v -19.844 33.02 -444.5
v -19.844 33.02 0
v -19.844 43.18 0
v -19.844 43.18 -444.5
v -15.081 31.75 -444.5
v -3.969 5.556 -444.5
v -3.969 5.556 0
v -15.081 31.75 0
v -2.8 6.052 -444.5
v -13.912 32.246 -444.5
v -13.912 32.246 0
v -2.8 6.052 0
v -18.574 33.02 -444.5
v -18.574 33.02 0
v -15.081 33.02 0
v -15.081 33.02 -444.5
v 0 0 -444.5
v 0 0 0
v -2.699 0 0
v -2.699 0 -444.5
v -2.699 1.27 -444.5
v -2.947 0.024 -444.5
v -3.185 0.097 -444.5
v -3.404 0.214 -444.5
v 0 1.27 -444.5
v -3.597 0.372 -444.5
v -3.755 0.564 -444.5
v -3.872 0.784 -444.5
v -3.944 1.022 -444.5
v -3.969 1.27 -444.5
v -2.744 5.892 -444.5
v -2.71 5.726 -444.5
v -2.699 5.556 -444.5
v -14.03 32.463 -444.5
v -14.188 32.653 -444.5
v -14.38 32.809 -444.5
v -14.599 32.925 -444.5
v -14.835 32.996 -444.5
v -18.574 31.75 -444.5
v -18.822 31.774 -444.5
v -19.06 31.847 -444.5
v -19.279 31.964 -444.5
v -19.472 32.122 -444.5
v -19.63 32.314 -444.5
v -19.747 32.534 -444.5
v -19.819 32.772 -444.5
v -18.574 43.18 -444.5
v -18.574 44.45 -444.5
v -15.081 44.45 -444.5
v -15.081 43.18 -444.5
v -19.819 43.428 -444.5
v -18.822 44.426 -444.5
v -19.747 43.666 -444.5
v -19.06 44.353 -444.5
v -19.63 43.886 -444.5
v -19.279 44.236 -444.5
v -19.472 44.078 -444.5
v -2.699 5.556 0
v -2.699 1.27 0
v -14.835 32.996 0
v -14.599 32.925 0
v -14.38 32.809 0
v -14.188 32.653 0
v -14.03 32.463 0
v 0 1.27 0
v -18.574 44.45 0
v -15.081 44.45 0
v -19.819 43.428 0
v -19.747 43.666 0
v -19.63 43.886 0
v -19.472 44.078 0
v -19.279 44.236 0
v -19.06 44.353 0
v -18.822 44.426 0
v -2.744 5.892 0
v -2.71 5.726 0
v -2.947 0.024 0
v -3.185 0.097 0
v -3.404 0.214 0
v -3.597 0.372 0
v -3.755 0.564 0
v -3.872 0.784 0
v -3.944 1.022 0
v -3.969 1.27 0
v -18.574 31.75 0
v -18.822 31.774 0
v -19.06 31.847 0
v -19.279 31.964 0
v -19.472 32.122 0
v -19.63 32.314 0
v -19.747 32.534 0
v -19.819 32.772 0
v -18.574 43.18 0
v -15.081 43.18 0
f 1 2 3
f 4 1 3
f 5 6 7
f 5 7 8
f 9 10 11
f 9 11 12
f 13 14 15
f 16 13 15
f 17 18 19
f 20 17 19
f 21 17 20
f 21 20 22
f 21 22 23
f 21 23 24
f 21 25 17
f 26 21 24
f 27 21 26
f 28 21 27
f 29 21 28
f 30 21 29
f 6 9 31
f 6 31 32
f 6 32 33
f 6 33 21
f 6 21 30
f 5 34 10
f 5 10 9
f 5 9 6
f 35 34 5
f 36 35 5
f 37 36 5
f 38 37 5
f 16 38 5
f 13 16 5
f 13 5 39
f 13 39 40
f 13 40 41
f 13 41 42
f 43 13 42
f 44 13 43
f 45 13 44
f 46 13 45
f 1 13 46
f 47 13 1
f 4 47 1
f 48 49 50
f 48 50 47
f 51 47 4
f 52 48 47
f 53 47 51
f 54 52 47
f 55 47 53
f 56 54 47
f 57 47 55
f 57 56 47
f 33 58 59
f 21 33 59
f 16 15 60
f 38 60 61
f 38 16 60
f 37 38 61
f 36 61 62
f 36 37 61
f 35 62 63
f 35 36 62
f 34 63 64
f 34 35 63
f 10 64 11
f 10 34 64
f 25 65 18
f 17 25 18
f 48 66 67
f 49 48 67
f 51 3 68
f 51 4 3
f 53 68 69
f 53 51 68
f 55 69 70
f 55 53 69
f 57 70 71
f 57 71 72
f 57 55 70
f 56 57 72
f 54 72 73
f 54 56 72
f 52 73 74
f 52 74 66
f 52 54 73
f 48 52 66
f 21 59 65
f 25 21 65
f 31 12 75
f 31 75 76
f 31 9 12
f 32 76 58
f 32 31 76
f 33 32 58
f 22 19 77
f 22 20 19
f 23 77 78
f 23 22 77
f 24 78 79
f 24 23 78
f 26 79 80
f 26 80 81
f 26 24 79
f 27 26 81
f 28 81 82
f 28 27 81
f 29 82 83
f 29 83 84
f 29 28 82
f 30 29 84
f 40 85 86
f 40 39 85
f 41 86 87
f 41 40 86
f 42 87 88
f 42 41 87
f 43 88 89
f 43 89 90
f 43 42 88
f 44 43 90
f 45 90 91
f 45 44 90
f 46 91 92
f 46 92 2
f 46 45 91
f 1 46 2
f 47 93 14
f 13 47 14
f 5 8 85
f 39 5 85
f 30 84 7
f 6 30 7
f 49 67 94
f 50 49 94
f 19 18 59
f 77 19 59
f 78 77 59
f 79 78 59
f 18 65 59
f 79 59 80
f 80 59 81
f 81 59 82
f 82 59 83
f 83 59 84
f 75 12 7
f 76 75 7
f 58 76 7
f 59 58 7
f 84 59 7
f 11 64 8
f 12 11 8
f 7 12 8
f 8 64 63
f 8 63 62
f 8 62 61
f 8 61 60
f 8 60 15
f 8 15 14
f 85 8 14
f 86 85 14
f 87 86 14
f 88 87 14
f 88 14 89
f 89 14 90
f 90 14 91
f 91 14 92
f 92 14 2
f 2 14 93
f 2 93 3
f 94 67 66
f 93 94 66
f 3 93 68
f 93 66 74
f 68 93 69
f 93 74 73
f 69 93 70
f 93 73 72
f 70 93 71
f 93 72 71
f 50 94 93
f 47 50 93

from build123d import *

# Parameters (mm, degrees)
EXTRUDE_THIN1_DEPTH = 444.5
FILLET1_R           = 1.27


with BuildPart() as part:
    # Sketch1 → Extrude-Thin1 (new body)
    with BuildSketch(Plane.XY):
        Polygon((0, 0), (-3.96875, 0), (-3.96875, 5.55625), (-15.08125, 31.75), (-19.84375, 31.75), (-19.84375, 44.45), (-15.08125, 44.45), (-15.08125, 43.18), (-18.57375, 43.18), (-18.57375, 33.02), (-14.240475492, 33.02), (-2.69875, 5.814504197), (-2.69875, 1.27), (0, 1.27), align=None)
    extrude(amount=-EXTRUDE_THIN1_DEPTH)

    # Fillet1
    fillet1_edges = [part.edges().sort_by_distance(p)[0] for p in [
        (-14.240475492, 33.02, -222.25),
        (-2.69875, 5.814504197, -222.25),
        (-3.96875, 0, -222.25),
        (-19.84375, 31.75, -222.25),
        (-19.84375, 44.45, -222.25),
    ]]
    fillet(fillet1_edges, radius=FILLET1_R)


solid = part.part
